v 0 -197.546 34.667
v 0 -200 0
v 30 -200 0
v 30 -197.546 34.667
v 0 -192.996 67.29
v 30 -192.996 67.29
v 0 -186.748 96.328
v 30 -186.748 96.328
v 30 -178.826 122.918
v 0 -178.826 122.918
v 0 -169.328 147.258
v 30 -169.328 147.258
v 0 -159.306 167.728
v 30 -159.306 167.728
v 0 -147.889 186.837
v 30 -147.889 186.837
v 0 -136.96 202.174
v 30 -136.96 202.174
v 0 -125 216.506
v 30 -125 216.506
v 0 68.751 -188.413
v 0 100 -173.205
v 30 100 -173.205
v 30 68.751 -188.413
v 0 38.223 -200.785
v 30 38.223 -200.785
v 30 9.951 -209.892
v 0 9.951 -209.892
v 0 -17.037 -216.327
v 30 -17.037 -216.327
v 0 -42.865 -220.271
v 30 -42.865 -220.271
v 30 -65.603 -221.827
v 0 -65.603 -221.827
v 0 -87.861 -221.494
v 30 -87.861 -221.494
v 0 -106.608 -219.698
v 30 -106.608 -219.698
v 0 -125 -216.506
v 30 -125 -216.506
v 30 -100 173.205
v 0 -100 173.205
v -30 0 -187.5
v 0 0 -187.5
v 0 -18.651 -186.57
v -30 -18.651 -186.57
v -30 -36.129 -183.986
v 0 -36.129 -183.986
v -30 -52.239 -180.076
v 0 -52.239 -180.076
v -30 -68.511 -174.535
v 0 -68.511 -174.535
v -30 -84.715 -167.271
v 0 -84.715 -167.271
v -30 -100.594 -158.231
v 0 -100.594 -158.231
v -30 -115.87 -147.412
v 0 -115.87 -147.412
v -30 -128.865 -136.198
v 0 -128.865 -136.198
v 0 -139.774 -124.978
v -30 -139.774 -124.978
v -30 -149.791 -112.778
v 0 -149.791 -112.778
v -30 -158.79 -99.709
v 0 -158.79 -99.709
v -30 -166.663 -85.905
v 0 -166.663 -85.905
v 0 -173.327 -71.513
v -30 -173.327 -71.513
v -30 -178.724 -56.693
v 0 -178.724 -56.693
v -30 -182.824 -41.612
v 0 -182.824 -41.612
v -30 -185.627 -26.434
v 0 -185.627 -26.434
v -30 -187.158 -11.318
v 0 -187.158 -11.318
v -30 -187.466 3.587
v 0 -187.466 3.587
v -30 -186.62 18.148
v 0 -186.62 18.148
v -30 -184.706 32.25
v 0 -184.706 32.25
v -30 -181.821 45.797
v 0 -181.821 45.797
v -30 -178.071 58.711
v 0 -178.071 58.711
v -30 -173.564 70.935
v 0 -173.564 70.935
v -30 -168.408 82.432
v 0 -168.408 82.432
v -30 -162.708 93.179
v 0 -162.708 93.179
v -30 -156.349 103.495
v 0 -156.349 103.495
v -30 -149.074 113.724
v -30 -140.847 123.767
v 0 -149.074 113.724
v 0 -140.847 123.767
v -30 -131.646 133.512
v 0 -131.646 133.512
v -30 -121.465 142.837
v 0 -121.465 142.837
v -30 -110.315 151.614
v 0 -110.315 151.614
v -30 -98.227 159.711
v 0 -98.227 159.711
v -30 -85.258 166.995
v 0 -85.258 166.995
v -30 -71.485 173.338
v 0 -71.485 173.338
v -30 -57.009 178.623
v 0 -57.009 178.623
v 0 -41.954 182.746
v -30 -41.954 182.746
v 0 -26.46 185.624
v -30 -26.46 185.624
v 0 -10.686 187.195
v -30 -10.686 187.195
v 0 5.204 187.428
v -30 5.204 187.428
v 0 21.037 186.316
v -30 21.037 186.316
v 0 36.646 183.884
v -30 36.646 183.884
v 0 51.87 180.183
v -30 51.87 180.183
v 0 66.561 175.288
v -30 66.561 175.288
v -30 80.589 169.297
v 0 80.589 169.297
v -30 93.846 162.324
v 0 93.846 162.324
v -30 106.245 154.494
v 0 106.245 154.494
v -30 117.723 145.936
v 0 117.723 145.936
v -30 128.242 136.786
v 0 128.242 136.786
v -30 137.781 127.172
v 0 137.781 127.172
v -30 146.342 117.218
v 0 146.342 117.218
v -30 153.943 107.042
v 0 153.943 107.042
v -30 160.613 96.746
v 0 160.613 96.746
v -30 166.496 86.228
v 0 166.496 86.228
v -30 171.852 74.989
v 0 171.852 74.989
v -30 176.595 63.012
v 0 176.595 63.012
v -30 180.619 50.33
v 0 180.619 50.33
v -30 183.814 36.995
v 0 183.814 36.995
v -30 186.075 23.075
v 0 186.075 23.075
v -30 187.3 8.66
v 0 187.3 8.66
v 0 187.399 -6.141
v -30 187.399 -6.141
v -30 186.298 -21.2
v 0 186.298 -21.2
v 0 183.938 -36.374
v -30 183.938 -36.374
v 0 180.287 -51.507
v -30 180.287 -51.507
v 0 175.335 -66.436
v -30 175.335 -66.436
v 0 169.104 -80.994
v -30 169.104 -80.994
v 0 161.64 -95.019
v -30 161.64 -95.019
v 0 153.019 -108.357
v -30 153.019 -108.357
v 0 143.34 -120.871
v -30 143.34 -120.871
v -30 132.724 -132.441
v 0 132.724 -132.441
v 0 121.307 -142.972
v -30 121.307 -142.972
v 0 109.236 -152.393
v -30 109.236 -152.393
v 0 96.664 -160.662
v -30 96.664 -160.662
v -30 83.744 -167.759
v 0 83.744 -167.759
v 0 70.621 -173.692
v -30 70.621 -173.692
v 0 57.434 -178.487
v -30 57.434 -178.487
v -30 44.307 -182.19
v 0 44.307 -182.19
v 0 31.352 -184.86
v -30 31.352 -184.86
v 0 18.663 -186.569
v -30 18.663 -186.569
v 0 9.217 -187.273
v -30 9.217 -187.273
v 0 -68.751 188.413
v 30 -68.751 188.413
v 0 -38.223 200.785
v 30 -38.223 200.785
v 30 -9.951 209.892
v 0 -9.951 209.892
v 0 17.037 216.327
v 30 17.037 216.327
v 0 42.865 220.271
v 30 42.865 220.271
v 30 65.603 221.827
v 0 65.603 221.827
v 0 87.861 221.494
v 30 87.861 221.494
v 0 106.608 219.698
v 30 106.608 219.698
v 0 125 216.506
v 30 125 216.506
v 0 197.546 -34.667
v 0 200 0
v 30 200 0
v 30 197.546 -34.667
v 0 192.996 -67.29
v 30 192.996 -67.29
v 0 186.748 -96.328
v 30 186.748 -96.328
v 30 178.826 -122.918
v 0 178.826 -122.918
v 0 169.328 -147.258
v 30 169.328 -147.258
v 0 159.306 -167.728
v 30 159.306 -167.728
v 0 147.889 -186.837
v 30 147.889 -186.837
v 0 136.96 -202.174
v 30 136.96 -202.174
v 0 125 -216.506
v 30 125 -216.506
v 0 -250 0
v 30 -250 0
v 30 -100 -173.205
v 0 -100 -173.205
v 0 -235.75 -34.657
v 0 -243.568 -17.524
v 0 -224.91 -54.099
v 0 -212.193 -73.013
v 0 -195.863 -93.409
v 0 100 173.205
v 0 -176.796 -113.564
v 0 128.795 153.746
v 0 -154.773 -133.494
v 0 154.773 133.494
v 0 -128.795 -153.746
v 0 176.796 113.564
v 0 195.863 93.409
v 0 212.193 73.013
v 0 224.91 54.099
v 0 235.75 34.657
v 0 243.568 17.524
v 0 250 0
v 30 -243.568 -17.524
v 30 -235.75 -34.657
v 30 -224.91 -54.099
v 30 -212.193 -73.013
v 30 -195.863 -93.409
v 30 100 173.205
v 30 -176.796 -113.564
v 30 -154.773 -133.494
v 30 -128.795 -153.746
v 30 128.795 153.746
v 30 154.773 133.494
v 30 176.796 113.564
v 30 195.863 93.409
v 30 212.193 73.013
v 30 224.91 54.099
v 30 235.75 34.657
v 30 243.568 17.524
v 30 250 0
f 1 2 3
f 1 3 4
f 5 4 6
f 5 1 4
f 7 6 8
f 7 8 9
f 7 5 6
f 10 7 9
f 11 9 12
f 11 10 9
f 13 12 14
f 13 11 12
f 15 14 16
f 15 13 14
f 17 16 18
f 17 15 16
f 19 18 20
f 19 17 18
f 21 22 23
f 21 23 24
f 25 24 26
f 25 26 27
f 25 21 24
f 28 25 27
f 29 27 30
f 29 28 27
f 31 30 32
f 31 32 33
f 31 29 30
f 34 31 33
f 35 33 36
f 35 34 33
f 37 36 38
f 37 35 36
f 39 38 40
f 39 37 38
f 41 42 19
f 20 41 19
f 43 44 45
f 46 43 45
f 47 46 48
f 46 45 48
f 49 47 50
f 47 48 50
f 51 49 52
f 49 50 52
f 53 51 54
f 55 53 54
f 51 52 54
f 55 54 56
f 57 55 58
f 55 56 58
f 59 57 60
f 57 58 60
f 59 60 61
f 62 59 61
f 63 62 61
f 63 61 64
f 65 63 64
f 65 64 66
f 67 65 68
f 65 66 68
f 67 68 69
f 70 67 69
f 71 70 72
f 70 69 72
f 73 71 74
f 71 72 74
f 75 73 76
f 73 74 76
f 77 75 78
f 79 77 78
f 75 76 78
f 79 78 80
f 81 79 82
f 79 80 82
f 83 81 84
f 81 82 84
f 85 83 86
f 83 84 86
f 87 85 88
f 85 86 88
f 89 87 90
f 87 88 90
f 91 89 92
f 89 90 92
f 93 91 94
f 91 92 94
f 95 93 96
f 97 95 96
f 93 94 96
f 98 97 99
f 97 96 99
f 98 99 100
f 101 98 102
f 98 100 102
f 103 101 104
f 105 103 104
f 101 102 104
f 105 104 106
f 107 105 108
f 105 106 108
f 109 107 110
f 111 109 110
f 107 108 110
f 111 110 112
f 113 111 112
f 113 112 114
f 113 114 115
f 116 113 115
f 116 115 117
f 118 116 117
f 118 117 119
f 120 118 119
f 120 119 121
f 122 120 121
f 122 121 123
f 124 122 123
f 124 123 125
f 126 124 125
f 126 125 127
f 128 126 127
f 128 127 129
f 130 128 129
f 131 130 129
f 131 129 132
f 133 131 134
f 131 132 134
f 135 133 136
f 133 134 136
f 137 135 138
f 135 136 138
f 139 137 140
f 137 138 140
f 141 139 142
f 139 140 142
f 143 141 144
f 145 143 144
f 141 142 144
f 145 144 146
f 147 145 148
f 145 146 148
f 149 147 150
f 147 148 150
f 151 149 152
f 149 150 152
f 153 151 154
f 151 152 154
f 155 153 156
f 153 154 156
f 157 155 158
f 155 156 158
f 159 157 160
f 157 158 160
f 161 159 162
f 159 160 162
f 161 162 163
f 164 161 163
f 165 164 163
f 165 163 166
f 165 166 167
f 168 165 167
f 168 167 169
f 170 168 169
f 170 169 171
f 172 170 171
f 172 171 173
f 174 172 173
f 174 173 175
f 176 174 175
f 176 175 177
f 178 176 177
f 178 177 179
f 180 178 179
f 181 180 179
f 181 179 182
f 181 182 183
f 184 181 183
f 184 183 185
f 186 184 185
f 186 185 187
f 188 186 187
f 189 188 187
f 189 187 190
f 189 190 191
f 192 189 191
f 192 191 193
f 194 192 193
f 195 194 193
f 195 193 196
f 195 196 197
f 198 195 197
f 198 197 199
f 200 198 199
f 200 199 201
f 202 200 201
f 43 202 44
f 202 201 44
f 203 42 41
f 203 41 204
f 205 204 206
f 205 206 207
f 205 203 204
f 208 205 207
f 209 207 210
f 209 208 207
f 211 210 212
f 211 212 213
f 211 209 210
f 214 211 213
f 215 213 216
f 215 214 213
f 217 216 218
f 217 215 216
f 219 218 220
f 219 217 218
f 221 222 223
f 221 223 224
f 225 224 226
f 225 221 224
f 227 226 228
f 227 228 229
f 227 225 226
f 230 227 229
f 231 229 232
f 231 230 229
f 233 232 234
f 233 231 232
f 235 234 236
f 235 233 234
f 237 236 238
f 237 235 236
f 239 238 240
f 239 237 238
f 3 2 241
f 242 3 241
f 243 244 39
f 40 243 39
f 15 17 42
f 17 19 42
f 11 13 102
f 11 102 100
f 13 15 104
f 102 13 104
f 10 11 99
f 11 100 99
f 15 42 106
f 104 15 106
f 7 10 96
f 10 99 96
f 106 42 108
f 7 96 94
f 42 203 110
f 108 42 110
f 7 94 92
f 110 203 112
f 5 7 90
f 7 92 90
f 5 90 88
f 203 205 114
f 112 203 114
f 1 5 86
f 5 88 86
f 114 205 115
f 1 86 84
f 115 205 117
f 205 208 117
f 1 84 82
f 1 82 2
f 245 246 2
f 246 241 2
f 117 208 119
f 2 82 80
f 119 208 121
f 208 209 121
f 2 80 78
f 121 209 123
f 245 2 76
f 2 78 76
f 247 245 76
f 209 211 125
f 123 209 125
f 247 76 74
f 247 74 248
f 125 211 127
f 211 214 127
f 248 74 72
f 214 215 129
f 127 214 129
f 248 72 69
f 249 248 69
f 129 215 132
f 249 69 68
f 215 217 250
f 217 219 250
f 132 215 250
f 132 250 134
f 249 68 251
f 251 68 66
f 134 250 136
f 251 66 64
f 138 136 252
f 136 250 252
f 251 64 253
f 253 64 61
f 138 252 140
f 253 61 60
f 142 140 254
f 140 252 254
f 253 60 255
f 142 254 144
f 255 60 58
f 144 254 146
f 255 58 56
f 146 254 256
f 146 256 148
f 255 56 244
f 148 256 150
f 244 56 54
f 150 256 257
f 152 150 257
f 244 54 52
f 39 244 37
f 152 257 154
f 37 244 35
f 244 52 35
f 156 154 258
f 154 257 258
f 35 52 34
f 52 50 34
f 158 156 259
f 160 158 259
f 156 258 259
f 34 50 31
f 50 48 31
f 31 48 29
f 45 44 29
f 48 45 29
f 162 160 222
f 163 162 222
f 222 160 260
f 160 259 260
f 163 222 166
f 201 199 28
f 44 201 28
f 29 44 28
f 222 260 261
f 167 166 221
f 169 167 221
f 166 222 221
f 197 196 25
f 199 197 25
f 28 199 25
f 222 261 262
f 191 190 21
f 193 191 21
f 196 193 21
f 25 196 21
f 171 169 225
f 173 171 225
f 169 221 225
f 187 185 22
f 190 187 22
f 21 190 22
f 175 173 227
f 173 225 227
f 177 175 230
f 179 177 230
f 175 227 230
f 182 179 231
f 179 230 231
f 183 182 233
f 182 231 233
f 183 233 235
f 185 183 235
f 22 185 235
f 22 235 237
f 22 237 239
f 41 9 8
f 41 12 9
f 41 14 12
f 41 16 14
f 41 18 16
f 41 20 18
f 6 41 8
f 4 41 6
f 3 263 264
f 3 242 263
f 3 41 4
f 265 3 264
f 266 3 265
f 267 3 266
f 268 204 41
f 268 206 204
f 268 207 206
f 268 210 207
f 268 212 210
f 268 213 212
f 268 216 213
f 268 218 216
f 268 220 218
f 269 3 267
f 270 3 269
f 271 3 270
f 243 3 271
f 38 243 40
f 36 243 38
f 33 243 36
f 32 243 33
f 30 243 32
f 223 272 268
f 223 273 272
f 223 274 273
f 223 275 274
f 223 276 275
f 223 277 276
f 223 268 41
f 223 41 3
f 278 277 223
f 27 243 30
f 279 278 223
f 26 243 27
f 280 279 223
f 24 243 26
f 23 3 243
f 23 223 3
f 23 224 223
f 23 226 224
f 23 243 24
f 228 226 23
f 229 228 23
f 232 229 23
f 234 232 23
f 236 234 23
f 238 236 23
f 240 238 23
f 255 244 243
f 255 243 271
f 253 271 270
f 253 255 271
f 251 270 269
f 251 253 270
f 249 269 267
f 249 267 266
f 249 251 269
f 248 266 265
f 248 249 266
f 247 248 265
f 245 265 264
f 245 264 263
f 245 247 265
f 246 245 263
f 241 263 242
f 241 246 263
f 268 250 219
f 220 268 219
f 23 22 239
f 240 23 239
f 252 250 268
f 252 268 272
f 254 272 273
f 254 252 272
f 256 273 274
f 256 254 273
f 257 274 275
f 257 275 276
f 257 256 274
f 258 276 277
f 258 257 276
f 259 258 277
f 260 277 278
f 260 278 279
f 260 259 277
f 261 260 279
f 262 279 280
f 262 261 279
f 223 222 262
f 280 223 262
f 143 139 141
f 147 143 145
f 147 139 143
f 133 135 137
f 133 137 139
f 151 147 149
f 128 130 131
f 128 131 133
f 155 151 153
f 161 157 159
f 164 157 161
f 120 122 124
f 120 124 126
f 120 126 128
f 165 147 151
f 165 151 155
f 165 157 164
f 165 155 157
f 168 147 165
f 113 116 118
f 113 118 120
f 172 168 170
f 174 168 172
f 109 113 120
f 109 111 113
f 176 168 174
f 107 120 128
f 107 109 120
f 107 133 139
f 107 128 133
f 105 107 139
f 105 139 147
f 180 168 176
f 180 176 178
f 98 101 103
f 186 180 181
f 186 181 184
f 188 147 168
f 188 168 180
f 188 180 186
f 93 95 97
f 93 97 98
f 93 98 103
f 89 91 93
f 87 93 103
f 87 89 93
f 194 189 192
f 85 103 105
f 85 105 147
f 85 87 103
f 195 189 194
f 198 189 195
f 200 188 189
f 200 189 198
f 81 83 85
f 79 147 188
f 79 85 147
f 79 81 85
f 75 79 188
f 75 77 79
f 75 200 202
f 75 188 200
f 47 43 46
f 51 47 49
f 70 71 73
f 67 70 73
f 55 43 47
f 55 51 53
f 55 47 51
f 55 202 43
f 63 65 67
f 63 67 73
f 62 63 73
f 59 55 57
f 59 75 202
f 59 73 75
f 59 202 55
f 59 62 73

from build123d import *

# Parameters (mm, degrees)
BOSS_EXTRUDE1_DEPTH = 30
SKETCH2_R           = 150
BOSS_EXTRUDE2_DEPTH = 30
SCALE1_SCALE_X      = 1
SCALE1_SCALE_Y      = 1.25
SCALE1_SCALE_Z      = 1.25


with BuildPart() as part:
    # Sketch1 → Boss-Extrude1 (new body)
    with BuildSketch(Plane(origin=(0, 0, 0), x_dir=(0, 0, -1), z_dir=(1, 0, 0))):
        with BuildLine():
            Line((0, 160), (0, 200))
            add(Edge.make_bspline(
                [(-138.564064606, 80), (-78.974925655, 174.42159167), (0, 200)],
                knots=[0, 0, 0, 0.458760962, 0.458760962, 0.458760962], degree=2))
            Line((-138.564064606, 80), (-173.205080757, 100))
            add(Edge.make_bspline(
                [(-138.564064606, -80), (-190.540992182, 18.816503955), (-173.205080757, 100)],
                knots=[0, 0, 0, 0.458760962, 0.458760962, 0.458760962], degree=2))
            Line((-138.564064606, -80), (-173.205080757, -100))
            add(Edge.make_bspline(
                [(0, -160), (-111.566066527, -155.605087714), (-173.205080757, -100)],
                knots=[0, 0, 0, 0.458760962, 0.458760962, 0.458760962], degree=2))
            Line((0, -160), (0, -200))
            add(Edge.make_bspline(
                [(138.564064606, -80), (78.974925655, -174.42159167), (0, -200)],
                knots=[0, 0, 0, 0.458760962, 0.458760962, 0.458760962], degree=2))
            Line((138.564064606, -80), (173.205080757, -100))
            add(Edge.make_bspline(
                [(138.564064606, 80), (190.540992182, -18.816503955), (173.205080757, -100)],
                knots=[0, 0, 0, 0.458760962, 0.458760962, 0.458760962], degree=2))
            Line((138.564064606, 80), (173.205080757, 100))
            add(Edge.make_bspline(
                [(0, 160), (111.566066527, 155.605087714), (173.205080757, 100)],
                knots=[0, 0, 0, 0.458760962, 0.458760962, 0.458760962], degree=2))
        make_face()
    extrude(amount=BOSS_EXTRUDE1_DEPTH)

    # Sketch2 → Boss-Extrude2 (add)
    with BuildSketch(Plane.ZY):
        with Locations(Location((0, 0, 0), (0, 0, 180))):
            Circle(SKETCH2_R)
    extrude(amount=BOSS_EXTRUDE2_DEPTH)


with BuildPart() as part_1:
    # Scale1: scaled about (2.201532239, 0, 0)
    add(part.part.scale((SCALE1_SCALE_X, SCALE1_SCALE_Y, SCALE1_SCALE_Z), about=(2.201532239, 0, 0)))


solid = part_1.part
